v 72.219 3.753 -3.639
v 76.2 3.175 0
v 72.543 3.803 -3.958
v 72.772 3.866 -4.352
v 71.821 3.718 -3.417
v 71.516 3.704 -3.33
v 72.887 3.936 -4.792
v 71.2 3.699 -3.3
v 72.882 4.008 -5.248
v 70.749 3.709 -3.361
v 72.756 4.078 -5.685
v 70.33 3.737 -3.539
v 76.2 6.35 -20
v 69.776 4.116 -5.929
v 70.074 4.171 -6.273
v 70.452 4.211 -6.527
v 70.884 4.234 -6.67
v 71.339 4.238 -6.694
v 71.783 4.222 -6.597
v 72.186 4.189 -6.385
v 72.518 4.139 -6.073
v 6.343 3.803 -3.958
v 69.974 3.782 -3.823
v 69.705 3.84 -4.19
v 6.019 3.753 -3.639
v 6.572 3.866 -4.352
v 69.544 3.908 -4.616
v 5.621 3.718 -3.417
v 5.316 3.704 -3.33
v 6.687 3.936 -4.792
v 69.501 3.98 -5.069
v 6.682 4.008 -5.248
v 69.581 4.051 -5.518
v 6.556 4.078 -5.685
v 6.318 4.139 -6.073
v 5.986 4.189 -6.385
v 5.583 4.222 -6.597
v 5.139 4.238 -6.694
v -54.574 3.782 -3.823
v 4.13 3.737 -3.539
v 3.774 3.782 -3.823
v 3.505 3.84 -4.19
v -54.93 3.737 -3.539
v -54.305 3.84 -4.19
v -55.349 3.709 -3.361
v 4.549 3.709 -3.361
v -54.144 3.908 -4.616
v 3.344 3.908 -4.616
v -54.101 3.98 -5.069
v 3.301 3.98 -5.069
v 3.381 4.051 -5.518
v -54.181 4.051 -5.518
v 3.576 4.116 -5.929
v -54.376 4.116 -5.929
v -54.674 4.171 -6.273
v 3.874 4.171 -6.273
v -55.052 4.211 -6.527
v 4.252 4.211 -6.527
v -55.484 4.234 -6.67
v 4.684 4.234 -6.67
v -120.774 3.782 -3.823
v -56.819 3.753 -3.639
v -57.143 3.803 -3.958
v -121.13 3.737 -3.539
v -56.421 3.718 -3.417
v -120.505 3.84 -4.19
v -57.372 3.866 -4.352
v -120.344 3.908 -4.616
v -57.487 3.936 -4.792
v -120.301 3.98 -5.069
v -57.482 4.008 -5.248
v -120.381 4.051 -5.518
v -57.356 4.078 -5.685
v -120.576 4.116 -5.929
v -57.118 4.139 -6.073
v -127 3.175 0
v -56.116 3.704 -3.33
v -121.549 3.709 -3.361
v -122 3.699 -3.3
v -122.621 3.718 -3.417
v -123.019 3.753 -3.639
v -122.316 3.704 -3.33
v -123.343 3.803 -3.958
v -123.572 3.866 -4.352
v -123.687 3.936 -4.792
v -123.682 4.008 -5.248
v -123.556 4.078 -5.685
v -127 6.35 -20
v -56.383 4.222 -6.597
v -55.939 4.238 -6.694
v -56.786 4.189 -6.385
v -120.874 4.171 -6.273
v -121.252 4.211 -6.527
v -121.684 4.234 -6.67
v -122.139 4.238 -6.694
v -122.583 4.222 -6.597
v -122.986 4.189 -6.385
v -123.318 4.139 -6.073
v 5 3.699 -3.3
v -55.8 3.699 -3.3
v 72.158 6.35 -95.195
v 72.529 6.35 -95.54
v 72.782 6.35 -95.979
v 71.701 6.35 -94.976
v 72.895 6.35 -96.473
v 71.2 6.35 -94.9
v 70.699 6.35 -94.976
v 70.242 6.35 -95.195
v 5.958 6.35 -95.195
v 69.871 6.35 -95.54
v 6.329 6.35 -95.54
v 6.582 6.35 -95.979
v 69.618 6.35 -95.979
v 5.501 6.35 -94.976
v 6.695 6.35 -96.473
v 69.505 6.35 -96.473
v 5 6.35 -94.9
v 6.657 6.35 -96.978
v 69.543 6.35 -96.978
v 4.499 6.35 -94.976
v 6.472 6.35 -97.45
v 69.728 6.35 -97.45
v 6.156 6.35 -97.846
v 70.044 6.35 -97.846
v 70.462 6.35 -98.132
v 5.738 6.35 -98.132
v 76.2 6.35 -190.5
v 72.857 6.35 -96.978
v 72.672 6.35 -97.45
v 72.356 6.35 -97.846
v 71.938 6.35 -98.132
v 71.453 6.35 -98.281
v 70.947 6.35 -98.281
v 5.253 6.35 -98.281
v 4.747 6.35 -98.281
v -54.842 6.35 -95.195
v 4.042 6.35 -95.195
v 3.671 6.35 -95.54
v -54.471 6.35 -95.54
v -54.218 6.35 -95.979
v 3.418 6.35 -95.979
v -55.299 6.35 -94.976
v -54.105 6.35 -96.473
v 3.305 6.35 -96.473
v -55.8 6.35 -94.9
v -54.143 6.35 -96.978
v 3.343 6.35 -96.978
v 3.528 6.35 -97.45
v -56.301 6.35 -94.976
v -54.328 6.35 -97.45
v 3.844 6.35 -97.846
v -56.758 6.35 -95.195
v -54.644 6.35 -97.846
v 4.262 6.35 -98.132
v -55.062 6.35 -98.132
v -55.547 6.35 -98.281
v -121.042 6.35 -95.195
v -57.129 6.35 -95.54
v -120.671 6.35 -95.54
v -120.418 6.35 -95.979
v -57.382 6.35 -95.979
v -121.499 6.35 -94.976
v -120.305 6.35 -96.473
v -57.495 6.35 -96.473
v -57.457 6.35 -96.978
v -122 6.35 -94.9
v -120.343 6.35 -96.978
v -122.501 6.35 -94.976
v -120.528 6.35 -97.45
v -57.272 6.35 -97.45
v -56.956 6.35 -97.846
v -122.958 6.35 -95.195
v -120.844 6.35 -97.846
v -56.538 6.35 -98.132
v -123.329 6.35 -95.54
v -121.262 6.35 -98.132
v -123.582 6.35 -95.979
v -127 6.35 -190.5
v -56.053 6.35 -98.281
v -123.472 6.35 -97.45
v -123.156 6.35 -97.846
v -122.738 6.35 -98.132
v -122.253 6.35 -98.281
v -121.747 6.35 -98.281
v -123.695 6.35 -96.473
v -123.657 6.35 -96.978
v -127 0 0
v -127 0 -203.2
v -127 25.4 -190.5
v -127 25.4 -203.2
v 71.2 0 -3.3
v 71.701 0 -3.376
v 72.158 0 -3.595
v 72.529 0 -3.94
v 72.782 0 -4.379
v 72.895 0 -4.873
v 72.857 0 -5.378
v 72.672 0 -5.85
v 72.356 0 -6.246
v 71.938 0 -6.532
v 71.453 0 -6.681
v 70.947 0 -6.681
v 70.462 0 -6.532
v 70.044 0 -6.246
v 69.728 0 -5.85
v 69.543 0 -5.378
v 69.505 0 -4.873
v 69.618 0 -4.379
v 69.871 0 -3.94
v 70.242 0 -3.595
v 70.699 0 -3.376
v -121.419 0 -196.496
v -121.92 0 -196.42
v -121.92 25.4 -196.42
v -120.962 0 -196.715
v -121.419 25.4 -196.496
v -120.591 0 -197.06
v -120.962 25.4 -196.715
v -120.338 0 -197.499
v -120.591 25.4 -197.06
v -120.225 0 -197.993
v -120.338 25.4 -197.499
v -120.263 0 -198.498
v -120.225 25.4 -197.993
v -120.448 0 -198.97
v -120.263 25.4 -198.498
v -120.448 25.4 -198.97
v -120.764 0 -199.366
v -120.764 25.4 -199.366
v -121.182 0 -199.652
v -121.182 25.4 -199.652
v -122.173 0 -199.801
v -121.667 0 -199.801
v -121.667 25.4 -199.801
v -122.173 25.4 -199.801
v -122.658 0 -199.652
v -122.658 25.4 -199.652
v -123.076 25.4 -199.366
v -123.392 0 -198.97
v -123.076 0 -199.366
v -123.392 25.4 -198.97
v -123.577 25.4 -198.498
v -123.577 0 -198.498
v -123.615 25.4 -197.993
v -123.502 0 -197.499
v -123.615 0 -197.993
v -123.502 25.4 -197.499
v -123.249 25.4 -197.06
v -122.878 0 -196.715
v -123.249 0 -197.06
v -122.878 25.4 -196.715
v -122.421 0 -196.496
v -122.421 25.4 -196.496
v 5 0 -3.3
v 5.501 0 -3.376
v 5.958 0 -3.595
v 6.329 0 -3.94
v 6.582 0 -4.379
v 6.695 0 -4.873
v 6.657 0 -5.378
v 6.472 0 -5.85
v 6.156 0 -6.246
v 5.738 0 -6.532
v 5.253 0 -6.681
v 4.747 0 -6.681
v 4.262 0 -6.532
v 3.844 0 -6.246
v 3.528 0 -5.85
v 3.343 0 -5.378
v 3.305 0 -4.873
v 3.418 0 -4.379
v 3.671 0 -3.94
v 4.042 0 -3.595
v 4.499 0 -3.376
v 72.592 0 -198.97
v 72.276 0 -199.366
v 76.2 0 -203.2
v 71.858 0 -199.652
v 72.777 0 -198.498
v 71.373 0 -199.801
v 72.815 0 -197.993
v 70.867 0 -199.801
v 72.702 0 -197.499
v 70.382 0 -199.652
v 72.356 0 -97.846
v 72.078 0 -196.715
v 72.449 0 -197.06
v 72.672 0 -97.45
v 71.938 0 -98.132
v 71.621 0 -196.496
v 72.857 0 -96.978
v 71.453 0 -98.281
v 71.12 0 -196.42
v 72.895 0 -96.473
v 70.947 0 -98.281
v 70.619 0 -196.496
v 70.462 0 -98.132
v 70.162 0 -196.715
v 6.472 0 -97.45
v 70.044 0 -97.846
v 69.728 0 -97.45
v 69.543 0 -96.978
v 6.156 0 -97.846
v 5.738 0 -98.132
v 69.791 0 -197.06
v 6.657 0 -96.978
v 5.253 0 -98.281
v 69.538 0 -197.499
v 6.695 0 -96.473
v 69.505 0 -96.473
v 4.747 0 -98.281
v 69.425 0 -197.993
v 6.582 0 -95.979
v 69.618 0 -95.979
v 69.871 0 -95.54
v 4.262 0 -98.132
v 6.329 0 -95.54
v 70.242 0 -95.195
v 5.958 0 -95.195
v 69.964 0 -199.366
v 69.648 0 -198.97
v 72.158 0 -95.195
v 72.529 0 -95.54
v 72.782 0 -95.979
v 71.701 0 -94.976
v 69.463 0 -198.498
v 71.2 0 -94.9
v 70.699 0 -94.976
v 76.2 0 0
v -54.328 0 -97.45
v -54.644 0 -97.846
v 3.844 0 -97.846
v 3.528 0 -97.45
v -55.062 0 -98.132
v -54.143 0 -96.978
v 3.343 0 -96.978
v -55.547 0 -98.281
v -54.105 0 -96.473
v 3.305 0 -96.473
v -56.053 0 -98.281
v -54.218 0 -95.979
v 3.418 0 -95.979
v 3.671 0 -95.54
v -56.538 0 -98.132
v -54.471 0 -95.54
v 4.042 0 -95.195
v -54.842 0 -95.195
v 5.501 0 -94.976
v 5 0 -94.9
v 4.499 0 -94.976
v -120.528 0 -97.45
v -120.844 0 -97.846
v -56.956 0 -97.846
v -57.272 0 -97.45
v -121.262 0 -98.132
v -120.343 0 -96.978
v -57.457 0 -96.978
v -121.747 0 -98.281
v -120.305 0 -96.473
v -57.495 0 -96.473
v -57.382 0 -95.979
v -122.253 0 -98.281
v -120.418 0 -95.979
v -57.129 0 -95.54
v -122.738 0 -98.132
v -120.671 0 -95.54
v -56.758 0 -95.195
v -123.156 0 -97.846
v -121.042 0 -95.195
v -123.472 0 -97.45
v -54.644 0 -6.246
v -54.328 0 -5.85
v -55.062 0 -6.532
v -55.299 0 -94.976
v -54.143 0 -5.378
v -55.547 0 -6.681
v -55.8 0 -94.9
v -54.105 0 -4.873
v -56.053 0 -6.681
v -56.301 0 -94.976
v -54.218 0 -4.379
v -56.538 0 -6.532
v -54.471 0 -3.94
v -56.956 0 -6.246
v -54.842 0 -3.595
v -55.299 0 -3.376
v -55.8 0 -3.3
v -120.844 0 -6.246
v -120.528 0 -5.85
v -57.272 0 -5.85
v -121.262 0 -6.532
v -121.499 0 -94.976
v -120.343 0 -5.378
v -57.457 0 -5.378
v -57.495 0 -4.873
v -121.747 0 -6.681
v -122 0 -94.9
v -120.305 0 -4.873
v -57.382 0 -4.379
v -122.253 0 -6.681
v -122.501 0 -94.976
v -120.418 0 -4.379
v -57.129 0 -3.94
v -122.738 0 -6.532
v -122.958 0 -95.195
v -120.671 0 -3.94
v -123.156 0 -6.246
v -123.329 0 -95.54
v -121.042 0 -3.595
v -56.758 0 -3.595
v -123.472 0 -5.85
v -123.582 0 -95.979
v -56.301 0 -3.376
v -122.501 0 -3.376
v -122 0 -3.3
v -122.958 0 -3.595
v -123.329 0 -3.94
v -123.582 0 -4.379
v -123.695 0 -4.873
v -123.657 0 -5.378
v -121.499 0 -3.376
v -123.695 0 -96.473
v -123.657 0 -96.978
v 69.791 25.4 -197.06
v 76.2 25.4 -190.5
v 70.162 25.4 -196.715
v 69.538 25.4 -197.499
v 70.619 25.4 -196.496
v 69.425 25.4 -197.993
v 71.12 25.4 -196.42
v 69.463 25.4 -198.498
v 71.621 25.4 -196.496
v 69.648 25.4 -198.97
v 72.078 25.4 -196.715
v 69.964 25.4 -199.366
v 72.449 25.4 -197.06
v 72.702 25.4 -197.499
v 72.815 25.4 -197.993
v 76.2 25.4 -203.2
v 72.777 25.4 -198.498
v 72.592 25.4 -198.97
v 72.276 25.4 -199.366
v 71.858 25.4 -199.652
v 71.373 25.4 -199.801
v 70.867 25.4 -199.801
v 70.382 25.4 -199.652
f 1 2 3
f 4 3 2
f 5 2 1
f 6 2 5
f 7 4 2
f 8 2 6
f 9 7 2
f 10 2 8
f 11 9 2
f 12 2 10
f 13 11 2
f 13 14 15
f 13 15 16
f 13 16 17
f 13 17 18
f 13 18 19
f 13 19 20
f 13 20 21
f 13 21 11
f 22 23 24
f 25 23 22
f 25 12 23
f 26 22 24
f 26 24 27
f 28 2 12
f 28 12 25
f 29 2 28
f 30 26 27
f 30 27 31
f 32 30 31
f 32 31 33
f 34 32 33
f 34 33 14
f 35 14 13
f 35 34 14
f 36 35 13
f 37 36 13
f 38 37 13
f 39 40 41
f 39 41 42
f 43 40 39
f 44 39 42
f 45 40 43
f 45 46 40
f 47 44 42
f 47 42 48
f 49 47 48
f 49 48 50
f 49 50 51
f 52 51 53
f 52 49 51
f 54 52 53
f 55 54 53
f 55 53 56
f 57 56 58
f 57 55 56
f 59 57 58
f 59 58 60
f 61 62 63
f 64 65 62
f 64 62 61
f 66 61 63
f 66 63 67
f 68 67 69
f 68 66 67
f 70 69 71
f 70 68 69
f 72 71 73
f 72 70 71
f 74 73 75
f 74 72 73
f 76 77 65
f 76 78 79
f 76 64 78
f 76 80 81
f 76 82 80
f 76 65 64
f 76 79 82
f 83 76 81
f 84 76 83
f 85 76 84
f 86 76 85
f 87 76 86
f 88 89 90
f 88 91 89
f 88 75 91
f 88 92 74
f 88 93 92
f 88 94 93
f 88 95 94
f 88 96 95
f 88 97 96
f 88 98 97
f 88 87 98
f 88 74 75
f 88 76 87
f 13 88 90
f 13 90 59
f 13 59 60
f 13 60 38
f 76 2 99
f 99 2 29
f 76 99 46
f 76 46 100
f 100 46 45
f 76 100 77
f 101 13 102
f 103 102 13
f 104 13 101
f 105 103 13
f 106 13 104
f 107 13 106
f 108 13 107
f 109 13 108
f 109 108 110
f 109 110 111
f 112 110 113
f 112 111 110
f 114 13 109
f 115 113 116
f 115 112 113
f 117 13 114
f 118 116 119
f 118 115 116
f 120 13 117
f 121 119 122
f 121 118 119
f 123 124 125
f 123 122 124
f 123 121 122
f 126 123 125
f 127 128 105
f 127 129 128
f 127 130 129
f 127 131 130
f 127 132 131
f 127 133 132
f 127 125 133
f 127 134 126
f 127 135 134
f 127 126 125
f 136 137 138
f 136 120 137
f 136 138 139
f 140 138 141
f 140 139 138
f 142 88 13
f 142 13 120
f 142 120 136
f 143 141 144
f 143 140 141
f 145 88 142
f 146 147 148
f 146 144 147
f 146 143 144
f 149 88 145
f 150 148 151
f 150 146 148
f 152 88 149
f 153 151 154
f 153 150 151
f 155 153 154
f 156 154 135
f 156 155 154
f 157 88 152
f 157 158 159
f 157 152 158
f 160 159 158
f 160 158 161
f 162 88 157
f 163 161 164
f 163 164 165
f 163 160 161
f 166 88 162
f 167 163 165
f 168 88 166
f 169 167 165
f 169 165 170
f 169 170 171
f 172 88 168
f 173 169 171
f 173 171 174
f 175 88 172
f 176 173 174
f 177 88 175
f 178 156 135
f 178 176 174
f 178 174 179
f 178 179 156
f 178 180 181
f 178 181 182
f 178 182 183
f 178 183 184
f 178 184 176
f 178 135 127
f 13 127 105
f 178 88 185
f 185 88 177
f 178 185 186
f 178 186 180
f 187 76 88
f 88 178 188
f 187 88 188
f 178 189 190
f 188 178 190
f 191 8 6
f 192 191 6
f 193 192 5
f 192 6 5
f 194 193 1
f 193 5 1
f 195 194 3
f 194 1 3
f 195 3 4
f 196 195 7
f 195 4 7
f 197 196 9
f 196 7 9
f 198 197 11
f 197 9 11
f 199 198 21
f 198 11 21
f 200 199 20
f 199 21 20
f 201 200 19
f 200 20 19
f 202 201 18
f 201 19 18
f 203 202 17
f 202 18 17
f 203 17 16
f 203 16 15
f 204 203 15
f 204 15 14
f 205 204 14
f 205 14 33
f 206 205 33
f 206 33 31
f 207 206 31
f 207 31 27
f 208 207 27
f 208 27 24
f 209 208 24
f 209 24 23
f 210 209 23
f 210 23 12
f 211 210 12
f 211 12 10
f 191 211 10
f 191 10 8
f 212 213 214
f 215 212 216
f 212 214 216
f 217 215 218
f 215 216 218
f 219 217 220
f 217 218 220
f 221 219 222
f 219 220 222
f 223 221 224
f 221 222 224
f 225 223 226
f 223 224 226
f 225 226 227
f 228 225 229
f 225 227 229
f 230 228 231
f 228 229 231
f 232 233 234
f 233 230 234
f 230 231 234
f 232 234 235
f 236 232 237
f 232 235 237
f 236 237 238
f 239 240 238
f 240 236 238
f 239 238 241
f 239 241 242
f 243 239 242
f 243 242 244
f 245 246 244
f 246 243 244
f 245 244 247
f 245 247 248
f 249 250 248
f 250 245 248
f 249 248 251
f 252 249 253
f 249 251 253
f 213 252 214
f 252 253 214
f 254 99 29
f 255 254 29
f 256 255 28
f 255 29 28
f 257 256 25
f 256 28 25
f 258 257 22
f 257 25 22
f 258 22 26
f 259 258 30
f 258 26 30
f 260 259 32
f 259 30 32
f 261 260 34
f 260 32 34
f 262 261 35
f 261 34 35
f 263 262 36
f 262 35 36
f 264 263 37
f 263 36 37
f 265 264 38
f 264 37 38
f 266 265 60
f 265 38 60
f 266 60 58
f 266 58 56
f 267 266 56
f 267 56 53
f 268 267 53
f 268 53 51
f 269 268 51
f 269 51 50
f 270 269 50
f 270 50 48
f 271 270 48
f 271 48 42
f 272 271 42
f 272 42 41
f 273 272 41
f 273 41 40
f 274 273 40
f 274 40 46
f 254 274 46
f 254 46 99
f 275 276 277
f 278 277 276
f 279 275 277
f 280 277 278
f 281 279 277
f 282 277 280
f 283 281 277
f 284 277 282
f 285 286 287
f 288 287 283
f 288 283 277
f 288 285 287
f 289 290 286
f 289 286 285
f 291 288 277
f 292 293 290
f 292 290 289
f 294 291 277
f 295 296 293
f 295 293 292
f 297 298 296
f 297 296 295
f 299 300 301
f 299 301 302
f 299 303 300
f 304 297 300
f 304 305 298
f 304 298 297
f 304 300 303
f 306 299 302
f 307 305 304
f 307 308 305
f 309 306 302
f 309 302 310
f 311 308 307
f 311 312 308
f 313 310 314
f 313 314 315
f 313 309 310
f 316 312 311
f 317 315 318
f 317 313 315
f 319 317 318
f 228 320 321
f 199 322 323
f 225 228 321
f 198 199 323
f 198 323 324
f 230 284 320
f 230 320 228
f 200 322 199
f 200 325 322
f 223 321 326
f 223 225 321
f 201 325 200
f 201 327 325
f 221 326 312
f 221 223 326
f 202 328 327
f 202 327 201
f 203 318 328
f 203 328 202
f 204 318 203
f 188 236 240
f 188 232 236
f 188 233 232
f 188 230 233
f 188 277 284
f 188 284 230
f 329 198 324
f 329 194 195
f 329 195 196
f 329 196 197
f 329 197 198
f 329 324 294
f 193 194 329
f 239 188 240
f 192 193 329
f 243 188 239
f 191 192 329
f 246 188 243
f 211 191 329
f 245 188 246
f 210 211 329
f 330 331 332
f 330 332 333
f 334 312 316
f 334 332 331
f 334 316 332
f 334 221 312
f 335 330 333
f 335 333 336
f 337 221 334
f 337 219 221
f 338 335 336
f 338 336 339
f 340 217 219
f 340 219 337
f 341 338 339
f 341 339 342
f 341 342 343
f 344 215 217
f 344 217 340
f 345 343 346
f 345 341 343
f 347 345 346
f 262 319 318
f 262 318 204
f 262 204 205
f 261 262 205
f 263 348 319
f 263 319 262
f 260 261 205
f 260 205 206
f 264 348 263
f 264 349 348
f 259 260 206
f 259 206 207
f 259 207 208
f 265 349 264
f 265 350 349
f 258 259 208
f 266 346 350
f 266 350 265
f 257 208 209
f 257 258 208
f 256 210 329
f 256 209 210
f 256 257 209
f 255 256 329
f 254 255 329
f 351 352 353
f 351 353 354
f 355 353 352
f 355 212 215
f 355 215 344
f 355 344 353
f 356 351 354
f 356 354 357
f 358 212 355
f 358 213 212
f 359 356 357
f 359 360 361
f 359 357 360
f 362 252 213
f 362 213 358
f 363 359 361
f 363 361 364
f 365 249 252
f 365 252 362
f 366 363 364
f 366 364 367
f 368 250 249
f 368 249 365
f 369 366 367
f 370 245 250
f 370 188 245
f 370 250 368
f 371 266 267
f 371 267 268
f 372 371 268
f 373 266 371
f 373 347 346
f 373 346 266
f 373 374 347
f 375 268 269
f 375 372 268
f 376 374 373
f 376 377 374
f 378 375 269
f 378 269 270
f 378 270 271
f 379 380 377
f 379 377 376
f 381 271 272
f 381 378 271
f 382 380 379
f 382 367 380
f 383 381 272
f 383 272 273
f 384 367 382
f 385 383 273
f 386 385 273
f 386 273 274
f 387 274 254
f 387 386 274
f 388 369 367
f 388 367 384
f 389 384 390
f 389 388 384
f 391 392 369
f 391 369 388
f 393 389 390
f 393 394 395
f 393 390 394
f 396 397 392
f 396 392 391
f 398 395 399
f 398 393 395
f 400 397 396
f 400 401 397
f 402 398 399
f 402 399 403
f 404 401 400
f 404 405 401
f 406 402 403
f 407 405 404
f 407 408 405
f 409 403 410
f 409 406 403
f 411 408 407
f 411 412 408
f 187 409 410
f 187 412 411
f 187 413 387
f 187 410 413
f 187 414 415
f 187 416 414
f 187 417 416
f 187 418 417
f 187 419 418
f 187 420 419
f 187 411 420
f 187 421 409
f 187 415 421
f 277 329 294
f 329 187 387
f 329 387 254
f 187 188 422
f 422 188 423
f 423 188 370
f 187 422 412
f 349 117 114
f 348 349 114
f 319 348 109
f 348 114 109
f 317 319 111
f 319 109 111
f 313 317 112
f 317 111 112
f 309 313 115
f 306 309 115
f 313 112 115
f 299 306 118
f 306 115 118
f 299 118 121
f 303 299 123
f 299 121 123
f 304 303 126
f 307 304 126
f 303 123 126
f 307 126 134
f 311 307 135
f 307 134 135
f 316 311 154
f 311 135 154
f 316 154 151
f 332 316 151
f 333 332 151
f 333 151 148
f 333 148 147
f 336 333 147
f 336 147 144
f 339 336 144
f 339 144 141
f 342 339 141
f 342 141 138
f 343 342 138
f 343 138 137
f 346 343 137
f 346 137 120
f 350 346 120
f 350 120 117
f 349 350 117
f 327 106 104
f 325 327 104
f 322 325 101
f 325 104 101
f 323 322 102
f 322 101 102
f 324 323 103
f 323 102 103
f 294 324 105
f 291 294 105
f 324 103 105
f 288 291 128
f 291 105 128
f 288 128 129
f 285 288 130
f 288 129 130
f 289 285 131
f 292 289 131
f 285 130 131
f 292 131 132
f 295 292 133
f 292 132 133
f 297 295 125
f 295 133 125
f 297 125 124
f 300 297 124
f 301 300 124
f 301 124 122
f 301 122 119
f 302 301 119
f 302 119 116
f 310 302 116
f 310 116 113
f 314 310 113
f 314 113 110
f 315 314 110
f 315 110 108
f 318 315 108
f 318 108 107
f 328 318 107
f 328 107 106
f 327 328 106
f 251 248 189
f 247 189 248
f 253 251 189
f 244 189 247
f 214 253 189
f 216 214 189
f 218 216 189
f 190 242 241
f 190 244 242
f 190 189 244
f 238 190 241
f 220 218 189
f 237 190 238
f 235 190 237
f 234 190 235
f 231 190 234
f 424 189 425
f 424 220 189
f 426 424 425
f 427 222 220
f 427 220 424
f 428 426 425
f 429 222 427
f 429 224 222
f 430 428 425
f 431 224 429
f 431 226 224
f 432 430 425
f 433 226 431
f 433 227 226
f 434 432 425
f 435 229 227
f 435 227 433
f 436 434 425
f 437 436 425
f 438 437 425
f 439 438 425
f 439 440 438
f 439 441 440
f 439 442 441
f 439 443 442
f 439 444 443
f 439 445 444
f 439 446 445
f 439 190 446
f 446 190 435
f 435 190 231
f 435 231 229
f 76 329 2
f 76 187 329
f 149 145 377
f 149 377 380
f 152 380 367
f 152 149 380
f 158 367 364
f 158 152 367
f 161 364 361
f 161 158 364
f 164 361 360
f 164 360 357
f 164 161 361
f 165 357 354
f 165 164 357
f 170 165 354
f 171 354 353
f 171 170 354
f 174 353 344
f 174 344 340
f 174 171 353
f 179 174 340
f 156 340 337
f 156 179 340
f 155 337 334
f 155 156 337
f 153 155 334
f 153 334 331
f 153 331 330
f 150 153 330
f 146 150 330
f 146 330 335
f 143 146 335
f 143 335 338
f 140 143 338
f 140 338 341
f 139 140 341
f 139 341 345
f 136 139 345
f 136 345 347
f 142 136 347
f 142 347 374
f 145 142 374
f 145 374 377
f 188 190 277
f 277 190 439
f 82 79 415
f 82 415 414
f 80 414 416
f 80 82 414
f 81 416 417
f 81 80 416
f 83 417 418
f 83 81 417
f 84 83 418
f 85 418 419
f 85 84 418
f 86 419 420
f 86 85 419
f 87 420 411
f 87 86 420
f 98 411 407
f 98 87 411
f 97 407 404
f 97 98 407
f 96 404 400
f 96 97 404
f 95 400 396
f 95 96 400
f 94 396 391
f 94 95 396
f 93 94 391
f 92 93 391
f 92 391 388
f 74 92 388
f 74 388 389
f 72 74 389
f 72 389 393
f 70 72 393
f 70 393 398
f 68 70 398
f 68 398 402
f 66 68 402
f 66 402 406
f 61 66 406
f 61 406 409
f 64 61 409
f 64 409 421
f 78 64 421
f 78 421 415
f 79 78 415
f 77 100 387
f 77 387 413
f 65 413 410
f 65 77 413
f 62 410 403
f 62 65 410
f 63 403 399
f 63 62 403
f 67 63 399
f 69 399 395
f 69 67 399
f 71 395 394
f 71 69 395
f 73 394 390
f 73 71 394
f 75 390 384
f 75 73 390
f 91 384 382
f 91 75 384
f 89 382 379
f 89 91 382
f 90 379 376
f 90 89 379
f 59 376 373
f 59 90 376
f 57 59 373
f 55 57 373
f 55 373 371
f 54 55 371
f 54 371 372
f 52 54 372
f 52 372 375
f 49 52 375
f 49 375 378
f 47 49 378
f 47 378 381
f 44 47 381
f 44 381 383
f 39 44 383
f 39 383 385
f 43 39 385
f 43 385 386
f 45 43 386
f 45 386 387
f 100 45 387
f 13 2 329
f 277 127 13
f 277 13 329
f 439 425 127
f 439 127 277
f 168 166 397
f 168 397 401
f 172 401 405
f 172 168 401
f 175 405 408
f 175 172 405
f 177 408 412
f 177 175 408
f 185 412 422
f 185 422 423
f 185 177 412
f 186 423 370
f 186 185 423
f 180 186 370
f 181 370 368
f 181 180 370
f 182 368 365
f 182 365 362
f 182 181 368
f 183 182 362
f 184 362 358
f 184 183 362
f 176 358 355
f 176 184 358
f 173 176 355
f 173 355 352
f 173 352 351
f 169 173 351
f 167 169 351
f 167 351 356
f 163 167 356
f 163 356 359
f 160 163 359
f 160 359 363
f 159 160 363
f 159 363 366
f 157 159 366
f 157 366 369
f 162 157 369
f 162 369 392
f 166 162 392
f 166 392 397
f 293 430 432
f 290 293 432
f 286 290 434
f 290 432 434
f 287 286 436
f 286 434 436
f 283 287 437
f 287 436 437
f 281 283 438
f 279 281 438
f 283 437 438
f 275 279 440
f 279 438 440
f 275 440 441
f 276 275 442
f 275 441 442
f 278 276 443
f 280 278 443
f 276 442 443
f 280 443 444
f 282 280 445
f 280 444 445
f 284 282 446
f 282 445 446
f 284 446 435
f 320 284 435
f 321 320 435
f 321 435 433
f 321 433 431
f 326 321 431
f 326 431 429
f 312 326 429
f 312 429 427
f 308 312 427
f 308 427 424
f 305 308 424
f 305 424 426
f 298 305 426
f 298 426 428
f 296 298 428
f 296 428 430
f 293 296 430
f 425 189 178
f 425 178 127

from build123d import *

# Parameters (mm, degrees)
SKETCH1_W           = 76.2
SKETCH1_H           = 101.6
BOSS_EXTRUDE1_DEPTH = 6.35
SKETCH2_R           = 1.7
CUT_EXTRUDE1_DEPTH  = 218.110576665
CUT_EXTRUDE2_DEPTH  = 218.110576665
BOSS_EXTRUDE2_DEPTH = 50.8
BOSS_EXTRUDE5_START = 19.05
SKETCH8_W           = 203.2
SKETCH8_H           = 12.7
SKETCH8_R           = 1.7
BOSS_EXTRUDE5_DEPTH = 19.05


with BuildPart() as part:
    # Sketch1 → Boss-Extrude1 (new body)
    with BuildSketch(Plane(origin=(0, 0, 0), x_dir=(1, 0, 0), z_dir=(0, 1, 0))):
        with Locations((38.1, 50.8)):
            Rectangle(SKETCH1_W, SKETCH1_H)
        with Locations((38.1, 152.4)):
            Rectangle(SKETCH1_W, SKETCH1_H)
    extrude(amount=BOSS_EXTRUDE1_DEPTH)

    # Sketch2 → Cut-Extrude1 (cut, through all)
    with BuildSketch(Plane(origin=(0, 6.35, 0), x_dir=(1, 0, 0), z_dir=(0, 1, 0))):
        with Locations(Location((5, 96.6, 0), (0, 0, 270))):
            Circle(SKETCH2_R)
        with Locations(Location((71.2, 96.6, 0), (0, 0, 270))):
            Circle(SKETCH2_R)
        with Locations(Location((5, 5, 0), (0, 0, 270))):
            Circle(SKETCH2_R)
        with Locations(Location((71.2, 5, 0), (0, 0, 270))):
            Circle(SKETCH2_R)
        with Locations(Location((71.12, 198.12, 0), (0, 0, 270))):
            Circle(SKETCH2_R)
    extrude(amount=-CUT_EXTRUDE1_DEPTH, mode=Mode.SUBTRACT)

    # Sketch3 → Cut-Extrude2 (cut, through all)
    with BuildSketch(Plane.ZY):
        Polygon((-20, 6.35), (0, 3.175), (0, 6.35), align=None)
    extrude(amount=-CUT_EXTRUDE2_DEPTH, mode=Mode.SUBTRACT)


with BuildPart() as body_2:
    # Mirror3: mirrored copy
    add(part.part.mirror(Plane.ZY.offset(25.4)))


with BuildPart() as part_1:
    add(part.part)

    add(body_2.part)  # Boss-Extrude2 merges body 2
    # Sketch5 → Boss-Extrude2 (add)
    with BuildSketch(Plane(origin=(-50.8, 0, 0), x_dir=(0, 0, -1), z_dir=(1, 0, 0))):
        Polygon((20, 6.35), (203.2, 6.35), (203.2, 0), (0, 0), (0, 3.175), align=None)
    extrude(amount=BOSS_EXTRUDE2_DEPTH)

    # Sketch8 → Boss-Extrude5 (add)
    with BuildSketch(Plane(origin=(0, 6.35, 0), x_dir=(1, 0, 0), z_dir=(0, 1, 0)).offset(BOSS_EXTRUDE5_START)):
        with Locations((-25.4, 196.85)):
            Rectangle(SKETCH8_W, SKETCH8_H)
        with Locations(Location((-121.92, 198.12, 0), (0, 0, 270))):
            Circle(SKETCH8_R, mode=Mode.SUBTRACT)
        with Locations(Location((71.12, 198.12, 0), (0, 0, 270))):
            Circle(SKETCH8_R, mode=Mode.SUBTRACT)
    extrude(amount=-BOSS_EXTRUDE5_DEPTH)


solid = part_1.part
